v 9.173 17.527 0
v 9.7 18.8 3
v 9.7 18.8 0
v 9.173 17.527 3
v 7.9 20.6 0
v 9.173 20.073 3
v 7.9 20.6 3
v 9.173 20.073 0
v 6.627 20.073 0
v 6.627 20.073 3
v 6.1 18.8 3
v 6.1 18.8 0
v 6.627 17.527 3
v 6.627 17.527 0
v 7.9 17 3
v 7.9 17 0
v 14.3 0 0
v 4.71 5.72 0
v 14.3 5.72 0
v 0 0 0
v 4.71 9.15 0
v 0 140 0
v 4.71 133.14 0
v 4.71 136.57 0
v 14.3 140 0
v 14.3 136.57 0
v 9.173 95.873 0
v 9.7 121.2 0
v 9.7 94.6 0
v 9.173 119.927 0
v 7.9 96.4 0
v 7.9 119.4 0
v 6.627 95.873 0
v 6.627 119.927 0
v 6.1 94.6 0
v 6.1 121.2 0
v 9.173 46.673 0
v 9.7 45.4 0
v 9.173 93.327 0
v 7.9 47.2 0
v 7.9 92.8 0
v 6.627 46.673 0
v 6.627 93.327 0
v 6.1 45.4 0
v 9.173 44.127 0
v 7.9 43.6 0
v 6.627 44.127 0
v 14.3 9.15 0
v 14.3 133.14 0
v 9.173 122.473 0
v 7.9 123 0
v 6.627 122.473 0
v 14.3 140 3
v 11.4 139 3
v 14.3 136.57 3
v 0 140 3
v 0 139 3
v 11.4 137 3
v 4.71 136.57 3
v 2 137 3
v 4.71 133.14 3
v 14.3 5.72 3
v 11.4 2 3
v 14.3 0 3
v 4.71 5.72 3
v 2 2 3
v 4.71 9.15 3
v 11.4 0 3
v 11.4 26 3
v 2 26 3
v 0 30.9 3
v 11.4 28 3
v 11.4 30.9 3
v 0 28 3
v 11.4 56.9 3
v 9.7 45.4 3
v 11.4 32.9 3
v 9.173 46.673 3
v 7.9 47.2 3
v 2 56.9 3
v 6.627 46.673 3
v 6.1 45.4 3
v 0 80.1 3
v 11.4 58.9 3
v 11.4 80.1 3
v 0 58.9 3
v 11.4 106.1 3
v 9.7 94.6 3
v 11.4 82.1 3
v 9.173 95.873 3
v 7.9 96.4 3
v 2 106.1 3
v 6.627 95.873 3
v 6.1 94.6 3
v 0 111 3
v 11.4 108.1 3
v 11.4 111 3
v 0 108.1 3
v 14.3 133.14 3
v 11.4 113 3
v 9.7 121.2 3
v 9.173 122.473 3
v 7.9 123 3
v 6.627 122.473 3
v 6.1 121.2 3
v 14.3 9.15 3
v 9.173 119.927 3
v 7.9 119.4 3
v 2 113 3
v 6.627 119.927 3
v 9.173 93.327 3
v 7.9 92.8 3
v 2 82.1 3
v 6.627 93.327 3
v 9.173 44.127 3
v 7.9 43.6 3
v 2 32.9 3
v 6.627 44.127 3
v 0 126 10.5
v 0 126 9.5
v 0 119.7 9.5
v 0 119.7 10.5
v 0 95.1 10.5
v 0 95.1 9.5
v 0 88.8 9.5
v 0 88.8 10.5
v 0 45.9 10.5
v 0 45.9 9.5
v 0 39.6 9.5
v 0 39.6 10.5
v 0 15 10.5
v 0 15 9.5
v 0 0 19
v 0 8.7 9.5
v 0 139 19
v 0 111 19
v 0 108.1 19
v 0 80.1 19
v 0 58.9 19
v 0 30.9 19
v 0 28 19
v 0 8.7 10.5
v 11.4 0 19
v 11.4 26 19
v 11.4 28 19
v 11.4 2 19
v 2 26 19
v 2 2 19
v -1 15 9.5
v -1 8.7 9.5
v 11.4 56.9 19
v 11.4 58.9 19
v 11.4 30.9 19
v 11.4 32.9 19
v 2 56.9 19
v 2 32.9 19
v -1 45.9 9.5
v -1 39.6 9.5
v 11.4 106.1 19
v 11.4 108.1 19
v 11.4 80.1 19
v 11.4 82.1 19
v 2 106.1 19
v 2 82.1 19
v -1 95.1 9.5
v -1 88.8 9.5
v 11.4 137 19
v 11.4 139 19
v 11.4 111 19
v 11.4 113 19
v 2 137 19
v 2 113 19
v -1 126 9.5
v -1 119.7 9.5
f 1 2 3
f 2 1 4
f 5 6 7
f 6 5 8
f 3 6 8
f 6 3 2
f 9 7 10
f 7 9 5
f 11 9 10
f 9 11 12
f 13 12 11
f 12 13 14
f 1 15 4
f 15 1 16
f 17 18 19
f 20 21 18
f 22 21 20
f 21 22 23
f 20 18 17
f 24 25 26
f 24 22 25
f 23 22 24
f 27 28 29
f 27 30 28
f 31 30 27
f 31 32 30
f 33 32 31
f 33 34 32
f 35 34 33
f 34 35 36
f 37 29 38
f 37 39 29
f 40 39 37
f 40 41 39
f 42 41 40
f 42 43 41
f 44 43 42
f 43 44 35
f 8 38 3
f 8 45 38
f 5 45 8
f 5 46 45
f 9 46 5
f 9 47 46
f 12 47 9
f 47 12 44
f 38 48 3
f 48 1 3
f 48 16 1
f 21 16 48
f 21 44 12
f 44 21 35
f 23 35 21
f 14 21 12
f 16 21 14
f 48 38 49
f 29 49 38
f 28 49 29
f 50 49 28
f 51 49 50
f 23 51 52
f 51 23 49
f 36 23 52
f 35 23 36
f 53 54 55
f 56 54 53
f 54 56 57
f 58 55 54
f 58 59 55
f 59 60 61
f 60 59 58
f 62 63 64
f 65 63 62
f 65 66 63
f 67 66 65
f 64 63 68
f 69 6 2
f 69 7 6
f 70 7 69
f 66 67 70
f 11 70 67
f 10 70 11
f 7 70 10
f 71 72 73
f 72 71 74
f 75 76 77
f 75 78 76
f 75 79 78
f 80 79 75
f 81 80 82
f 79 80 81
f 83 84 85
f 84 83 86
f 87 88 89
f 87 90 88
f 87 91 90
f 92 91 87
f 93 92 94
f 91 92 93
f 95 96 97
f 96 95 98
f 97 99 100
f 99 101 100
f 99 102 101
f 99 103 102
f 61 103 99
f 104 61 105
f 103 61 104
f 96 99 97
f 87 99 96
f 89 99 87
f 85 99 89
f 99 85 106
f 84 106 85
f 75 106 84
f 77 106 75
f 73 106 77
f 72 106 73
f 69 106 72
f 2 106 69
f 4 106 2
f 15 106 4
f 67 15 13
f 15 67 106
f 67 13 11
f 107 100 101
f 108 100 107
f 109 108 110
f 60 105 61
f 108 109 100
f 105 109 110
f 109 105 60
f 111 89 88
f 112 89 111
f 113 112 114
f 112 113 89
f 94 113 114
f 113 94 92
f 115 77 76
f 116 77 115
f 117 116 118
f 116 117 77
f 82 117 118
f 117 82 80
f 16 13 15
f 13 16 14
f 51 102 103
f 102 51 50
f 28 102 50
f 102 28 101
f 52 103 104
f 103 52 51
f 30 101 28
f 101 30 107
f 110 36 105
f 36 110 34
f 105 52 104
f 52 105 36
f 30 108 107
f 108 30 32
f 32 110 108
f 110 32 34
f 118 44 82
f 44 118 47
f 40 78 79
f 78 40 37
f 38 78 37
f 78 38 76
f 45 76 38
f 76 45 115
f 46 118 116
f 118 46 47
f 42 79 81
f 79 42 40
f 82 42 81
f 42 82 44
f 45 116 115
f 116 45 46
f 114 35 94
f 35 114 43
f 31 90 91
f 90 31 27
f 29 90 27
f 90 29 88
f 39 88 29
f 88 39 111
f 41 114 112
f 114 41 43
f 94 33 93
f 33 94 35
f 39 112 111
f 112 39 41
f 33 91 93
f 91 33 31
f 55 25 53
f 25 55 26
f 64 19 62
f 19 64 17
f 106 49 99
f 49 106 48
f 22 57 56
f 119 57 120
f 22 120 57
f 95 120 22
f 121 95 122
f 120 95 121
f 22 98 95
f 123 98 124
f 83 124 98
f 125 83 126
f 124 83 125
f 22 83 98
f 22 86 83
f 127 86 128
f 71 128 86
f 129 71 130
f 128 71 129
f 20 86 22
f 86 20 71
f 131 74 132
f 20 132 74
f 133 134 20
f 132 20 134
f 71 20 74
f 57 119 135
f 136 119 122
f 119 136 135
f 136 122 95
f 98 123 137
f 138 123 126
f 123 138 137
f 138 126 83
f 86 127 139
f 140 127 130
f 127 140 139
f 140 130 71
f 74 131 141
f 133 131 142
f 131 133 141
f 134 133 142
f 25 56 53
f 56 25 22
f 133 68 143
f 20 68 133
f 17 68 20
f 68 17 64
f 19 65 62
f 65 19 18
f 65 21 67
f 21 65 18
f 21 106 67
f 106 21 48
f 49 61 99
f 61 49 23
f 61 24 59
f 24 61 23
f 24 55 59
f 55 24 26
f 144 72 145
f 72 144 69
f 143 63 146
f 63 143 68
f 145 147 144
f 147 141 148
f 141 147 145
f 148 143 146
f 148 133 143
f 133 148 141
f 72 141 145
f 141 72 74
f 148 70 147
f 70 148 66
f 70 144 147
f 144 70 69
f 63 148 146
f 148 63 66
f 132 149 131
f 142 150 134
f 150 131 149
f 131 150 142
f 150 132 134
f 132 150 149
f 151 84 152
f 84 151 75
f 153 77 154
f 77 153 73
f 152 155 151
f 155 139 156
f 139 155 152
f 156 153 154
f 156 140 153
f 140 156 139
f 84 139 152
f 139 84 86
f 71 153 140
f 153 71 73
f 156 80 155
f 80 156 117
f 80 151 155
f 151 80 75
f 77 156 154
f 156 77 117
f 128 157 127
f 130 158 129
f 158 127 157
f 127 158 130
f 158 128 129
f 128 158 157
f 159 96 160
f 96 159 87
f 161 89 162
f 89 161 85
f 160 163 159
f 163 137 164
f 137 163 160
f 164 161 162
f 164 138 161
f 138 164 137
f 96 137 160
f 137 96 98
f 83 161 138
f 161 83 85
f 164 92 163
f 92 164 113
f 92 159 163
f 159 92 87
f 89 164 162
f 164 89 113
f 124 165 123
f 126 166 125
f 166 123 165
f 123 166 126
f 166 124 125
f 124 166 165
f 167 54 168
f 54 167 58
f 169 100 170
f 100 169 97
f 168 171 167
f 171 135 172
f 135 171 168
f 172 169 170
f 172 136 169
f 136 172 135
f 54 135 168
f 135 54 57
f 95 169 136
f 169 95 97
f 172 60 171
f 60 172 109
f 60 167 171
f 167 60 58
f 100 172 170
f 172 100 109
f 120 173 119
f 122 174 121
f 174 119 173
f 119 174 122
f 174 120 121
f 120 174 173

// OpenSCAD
/*
 Face bracket for a kitchen drawer
 Bracket is symetrical and is used for both left and right hand sides
 
*/

// Dimensions in mm
// Base plate
base_width = 14.3;
base_length = 140;
base_thickness = 3.0;
// Mirror notch and two holes
base_notch = [[4.71, 5.72], [base_width+0.1, 5.72], [base_width+0.1, 9.15], [4.71, 9.15]];
base_holes = [[7.9, 18.8], [7.9, 45.4]];
base_hole_diameter = 3.6;
wall = 2;
length=140;

base_plate(base_width, base_length, base_thickness, base_notch, base_holes);
//tab is 5 from edge
tabs();

// Convert 2D vectors to 3D with given Z value
function vec_xy_to_xyz(vec_2d, z) = [for ( a= [0:len(vec_2d)-1]) [vec_2d[a].x, vec_2d[a].y, 0]];

// Draw base plate with notch and holes
module base_plate(width, length, thickness, notches, holes) {
    // Use these to mirror notch at far end
    notch_y_min = min([for (a = [0:3]) notches[a].y]);
    notch_y_max = max([for (a = [0:3]) notches[a].y]);
    notch_width = notch_y_max - notch_y_min;

    difference() {
        cube([width, length, thickness]);
        // punch holes
        for (hole = vec_xy_to_xyz(holes, 2)) {
            echo("Drilling hole at ", hole);
            translate(hole)
                cylinder(h=thickness, r=base_hole_diameter/2, $fn=8);
            // Mirror hole
            mirror_hole = [hole.x, length - hole.y, hole.z];
            echo("Drilling mirror hole at ", mirror_hole);
            translate(mirror_hole)
                cylinder(h=thickness, r=base_hole_diameter/2, $fn=8);
        }
        // Cut notch
        linear_extrude(thickness)
            polygon(points=notches);
        // Far end notch should finish on y-axis at first y point
        notch_y_offset = length - notch_y_max - notch_width;
        translate([0, notch_y_offset,0])
            linear_extrude(thickness)
                polygon(points=notches);

    }
}
module tab() {
    difference() {
        cube([11.4, 28, 19]);
        translate([wall,wall, 0])
        cube([11.4-wall, 28-2*wall, 19+1]);
    }
    translate([0,(28/2)+1,19/2])
    nub();
}

module tabs() {
    translate([0, 0, 0])
    tab();
    translate([0, 30.9, 0])
    tab();
    // should be a 21 mm gap between pairs
    translate ([0, length-59.9, 0])
    tab();
    translate([0, length-29,0])
    tab();
}

module nub () {
    rotate([90,270,0]){
    linear_extrude(6.3)
    polygon(points=[[0,0], [0,1], [1,0]]);
    }

}
